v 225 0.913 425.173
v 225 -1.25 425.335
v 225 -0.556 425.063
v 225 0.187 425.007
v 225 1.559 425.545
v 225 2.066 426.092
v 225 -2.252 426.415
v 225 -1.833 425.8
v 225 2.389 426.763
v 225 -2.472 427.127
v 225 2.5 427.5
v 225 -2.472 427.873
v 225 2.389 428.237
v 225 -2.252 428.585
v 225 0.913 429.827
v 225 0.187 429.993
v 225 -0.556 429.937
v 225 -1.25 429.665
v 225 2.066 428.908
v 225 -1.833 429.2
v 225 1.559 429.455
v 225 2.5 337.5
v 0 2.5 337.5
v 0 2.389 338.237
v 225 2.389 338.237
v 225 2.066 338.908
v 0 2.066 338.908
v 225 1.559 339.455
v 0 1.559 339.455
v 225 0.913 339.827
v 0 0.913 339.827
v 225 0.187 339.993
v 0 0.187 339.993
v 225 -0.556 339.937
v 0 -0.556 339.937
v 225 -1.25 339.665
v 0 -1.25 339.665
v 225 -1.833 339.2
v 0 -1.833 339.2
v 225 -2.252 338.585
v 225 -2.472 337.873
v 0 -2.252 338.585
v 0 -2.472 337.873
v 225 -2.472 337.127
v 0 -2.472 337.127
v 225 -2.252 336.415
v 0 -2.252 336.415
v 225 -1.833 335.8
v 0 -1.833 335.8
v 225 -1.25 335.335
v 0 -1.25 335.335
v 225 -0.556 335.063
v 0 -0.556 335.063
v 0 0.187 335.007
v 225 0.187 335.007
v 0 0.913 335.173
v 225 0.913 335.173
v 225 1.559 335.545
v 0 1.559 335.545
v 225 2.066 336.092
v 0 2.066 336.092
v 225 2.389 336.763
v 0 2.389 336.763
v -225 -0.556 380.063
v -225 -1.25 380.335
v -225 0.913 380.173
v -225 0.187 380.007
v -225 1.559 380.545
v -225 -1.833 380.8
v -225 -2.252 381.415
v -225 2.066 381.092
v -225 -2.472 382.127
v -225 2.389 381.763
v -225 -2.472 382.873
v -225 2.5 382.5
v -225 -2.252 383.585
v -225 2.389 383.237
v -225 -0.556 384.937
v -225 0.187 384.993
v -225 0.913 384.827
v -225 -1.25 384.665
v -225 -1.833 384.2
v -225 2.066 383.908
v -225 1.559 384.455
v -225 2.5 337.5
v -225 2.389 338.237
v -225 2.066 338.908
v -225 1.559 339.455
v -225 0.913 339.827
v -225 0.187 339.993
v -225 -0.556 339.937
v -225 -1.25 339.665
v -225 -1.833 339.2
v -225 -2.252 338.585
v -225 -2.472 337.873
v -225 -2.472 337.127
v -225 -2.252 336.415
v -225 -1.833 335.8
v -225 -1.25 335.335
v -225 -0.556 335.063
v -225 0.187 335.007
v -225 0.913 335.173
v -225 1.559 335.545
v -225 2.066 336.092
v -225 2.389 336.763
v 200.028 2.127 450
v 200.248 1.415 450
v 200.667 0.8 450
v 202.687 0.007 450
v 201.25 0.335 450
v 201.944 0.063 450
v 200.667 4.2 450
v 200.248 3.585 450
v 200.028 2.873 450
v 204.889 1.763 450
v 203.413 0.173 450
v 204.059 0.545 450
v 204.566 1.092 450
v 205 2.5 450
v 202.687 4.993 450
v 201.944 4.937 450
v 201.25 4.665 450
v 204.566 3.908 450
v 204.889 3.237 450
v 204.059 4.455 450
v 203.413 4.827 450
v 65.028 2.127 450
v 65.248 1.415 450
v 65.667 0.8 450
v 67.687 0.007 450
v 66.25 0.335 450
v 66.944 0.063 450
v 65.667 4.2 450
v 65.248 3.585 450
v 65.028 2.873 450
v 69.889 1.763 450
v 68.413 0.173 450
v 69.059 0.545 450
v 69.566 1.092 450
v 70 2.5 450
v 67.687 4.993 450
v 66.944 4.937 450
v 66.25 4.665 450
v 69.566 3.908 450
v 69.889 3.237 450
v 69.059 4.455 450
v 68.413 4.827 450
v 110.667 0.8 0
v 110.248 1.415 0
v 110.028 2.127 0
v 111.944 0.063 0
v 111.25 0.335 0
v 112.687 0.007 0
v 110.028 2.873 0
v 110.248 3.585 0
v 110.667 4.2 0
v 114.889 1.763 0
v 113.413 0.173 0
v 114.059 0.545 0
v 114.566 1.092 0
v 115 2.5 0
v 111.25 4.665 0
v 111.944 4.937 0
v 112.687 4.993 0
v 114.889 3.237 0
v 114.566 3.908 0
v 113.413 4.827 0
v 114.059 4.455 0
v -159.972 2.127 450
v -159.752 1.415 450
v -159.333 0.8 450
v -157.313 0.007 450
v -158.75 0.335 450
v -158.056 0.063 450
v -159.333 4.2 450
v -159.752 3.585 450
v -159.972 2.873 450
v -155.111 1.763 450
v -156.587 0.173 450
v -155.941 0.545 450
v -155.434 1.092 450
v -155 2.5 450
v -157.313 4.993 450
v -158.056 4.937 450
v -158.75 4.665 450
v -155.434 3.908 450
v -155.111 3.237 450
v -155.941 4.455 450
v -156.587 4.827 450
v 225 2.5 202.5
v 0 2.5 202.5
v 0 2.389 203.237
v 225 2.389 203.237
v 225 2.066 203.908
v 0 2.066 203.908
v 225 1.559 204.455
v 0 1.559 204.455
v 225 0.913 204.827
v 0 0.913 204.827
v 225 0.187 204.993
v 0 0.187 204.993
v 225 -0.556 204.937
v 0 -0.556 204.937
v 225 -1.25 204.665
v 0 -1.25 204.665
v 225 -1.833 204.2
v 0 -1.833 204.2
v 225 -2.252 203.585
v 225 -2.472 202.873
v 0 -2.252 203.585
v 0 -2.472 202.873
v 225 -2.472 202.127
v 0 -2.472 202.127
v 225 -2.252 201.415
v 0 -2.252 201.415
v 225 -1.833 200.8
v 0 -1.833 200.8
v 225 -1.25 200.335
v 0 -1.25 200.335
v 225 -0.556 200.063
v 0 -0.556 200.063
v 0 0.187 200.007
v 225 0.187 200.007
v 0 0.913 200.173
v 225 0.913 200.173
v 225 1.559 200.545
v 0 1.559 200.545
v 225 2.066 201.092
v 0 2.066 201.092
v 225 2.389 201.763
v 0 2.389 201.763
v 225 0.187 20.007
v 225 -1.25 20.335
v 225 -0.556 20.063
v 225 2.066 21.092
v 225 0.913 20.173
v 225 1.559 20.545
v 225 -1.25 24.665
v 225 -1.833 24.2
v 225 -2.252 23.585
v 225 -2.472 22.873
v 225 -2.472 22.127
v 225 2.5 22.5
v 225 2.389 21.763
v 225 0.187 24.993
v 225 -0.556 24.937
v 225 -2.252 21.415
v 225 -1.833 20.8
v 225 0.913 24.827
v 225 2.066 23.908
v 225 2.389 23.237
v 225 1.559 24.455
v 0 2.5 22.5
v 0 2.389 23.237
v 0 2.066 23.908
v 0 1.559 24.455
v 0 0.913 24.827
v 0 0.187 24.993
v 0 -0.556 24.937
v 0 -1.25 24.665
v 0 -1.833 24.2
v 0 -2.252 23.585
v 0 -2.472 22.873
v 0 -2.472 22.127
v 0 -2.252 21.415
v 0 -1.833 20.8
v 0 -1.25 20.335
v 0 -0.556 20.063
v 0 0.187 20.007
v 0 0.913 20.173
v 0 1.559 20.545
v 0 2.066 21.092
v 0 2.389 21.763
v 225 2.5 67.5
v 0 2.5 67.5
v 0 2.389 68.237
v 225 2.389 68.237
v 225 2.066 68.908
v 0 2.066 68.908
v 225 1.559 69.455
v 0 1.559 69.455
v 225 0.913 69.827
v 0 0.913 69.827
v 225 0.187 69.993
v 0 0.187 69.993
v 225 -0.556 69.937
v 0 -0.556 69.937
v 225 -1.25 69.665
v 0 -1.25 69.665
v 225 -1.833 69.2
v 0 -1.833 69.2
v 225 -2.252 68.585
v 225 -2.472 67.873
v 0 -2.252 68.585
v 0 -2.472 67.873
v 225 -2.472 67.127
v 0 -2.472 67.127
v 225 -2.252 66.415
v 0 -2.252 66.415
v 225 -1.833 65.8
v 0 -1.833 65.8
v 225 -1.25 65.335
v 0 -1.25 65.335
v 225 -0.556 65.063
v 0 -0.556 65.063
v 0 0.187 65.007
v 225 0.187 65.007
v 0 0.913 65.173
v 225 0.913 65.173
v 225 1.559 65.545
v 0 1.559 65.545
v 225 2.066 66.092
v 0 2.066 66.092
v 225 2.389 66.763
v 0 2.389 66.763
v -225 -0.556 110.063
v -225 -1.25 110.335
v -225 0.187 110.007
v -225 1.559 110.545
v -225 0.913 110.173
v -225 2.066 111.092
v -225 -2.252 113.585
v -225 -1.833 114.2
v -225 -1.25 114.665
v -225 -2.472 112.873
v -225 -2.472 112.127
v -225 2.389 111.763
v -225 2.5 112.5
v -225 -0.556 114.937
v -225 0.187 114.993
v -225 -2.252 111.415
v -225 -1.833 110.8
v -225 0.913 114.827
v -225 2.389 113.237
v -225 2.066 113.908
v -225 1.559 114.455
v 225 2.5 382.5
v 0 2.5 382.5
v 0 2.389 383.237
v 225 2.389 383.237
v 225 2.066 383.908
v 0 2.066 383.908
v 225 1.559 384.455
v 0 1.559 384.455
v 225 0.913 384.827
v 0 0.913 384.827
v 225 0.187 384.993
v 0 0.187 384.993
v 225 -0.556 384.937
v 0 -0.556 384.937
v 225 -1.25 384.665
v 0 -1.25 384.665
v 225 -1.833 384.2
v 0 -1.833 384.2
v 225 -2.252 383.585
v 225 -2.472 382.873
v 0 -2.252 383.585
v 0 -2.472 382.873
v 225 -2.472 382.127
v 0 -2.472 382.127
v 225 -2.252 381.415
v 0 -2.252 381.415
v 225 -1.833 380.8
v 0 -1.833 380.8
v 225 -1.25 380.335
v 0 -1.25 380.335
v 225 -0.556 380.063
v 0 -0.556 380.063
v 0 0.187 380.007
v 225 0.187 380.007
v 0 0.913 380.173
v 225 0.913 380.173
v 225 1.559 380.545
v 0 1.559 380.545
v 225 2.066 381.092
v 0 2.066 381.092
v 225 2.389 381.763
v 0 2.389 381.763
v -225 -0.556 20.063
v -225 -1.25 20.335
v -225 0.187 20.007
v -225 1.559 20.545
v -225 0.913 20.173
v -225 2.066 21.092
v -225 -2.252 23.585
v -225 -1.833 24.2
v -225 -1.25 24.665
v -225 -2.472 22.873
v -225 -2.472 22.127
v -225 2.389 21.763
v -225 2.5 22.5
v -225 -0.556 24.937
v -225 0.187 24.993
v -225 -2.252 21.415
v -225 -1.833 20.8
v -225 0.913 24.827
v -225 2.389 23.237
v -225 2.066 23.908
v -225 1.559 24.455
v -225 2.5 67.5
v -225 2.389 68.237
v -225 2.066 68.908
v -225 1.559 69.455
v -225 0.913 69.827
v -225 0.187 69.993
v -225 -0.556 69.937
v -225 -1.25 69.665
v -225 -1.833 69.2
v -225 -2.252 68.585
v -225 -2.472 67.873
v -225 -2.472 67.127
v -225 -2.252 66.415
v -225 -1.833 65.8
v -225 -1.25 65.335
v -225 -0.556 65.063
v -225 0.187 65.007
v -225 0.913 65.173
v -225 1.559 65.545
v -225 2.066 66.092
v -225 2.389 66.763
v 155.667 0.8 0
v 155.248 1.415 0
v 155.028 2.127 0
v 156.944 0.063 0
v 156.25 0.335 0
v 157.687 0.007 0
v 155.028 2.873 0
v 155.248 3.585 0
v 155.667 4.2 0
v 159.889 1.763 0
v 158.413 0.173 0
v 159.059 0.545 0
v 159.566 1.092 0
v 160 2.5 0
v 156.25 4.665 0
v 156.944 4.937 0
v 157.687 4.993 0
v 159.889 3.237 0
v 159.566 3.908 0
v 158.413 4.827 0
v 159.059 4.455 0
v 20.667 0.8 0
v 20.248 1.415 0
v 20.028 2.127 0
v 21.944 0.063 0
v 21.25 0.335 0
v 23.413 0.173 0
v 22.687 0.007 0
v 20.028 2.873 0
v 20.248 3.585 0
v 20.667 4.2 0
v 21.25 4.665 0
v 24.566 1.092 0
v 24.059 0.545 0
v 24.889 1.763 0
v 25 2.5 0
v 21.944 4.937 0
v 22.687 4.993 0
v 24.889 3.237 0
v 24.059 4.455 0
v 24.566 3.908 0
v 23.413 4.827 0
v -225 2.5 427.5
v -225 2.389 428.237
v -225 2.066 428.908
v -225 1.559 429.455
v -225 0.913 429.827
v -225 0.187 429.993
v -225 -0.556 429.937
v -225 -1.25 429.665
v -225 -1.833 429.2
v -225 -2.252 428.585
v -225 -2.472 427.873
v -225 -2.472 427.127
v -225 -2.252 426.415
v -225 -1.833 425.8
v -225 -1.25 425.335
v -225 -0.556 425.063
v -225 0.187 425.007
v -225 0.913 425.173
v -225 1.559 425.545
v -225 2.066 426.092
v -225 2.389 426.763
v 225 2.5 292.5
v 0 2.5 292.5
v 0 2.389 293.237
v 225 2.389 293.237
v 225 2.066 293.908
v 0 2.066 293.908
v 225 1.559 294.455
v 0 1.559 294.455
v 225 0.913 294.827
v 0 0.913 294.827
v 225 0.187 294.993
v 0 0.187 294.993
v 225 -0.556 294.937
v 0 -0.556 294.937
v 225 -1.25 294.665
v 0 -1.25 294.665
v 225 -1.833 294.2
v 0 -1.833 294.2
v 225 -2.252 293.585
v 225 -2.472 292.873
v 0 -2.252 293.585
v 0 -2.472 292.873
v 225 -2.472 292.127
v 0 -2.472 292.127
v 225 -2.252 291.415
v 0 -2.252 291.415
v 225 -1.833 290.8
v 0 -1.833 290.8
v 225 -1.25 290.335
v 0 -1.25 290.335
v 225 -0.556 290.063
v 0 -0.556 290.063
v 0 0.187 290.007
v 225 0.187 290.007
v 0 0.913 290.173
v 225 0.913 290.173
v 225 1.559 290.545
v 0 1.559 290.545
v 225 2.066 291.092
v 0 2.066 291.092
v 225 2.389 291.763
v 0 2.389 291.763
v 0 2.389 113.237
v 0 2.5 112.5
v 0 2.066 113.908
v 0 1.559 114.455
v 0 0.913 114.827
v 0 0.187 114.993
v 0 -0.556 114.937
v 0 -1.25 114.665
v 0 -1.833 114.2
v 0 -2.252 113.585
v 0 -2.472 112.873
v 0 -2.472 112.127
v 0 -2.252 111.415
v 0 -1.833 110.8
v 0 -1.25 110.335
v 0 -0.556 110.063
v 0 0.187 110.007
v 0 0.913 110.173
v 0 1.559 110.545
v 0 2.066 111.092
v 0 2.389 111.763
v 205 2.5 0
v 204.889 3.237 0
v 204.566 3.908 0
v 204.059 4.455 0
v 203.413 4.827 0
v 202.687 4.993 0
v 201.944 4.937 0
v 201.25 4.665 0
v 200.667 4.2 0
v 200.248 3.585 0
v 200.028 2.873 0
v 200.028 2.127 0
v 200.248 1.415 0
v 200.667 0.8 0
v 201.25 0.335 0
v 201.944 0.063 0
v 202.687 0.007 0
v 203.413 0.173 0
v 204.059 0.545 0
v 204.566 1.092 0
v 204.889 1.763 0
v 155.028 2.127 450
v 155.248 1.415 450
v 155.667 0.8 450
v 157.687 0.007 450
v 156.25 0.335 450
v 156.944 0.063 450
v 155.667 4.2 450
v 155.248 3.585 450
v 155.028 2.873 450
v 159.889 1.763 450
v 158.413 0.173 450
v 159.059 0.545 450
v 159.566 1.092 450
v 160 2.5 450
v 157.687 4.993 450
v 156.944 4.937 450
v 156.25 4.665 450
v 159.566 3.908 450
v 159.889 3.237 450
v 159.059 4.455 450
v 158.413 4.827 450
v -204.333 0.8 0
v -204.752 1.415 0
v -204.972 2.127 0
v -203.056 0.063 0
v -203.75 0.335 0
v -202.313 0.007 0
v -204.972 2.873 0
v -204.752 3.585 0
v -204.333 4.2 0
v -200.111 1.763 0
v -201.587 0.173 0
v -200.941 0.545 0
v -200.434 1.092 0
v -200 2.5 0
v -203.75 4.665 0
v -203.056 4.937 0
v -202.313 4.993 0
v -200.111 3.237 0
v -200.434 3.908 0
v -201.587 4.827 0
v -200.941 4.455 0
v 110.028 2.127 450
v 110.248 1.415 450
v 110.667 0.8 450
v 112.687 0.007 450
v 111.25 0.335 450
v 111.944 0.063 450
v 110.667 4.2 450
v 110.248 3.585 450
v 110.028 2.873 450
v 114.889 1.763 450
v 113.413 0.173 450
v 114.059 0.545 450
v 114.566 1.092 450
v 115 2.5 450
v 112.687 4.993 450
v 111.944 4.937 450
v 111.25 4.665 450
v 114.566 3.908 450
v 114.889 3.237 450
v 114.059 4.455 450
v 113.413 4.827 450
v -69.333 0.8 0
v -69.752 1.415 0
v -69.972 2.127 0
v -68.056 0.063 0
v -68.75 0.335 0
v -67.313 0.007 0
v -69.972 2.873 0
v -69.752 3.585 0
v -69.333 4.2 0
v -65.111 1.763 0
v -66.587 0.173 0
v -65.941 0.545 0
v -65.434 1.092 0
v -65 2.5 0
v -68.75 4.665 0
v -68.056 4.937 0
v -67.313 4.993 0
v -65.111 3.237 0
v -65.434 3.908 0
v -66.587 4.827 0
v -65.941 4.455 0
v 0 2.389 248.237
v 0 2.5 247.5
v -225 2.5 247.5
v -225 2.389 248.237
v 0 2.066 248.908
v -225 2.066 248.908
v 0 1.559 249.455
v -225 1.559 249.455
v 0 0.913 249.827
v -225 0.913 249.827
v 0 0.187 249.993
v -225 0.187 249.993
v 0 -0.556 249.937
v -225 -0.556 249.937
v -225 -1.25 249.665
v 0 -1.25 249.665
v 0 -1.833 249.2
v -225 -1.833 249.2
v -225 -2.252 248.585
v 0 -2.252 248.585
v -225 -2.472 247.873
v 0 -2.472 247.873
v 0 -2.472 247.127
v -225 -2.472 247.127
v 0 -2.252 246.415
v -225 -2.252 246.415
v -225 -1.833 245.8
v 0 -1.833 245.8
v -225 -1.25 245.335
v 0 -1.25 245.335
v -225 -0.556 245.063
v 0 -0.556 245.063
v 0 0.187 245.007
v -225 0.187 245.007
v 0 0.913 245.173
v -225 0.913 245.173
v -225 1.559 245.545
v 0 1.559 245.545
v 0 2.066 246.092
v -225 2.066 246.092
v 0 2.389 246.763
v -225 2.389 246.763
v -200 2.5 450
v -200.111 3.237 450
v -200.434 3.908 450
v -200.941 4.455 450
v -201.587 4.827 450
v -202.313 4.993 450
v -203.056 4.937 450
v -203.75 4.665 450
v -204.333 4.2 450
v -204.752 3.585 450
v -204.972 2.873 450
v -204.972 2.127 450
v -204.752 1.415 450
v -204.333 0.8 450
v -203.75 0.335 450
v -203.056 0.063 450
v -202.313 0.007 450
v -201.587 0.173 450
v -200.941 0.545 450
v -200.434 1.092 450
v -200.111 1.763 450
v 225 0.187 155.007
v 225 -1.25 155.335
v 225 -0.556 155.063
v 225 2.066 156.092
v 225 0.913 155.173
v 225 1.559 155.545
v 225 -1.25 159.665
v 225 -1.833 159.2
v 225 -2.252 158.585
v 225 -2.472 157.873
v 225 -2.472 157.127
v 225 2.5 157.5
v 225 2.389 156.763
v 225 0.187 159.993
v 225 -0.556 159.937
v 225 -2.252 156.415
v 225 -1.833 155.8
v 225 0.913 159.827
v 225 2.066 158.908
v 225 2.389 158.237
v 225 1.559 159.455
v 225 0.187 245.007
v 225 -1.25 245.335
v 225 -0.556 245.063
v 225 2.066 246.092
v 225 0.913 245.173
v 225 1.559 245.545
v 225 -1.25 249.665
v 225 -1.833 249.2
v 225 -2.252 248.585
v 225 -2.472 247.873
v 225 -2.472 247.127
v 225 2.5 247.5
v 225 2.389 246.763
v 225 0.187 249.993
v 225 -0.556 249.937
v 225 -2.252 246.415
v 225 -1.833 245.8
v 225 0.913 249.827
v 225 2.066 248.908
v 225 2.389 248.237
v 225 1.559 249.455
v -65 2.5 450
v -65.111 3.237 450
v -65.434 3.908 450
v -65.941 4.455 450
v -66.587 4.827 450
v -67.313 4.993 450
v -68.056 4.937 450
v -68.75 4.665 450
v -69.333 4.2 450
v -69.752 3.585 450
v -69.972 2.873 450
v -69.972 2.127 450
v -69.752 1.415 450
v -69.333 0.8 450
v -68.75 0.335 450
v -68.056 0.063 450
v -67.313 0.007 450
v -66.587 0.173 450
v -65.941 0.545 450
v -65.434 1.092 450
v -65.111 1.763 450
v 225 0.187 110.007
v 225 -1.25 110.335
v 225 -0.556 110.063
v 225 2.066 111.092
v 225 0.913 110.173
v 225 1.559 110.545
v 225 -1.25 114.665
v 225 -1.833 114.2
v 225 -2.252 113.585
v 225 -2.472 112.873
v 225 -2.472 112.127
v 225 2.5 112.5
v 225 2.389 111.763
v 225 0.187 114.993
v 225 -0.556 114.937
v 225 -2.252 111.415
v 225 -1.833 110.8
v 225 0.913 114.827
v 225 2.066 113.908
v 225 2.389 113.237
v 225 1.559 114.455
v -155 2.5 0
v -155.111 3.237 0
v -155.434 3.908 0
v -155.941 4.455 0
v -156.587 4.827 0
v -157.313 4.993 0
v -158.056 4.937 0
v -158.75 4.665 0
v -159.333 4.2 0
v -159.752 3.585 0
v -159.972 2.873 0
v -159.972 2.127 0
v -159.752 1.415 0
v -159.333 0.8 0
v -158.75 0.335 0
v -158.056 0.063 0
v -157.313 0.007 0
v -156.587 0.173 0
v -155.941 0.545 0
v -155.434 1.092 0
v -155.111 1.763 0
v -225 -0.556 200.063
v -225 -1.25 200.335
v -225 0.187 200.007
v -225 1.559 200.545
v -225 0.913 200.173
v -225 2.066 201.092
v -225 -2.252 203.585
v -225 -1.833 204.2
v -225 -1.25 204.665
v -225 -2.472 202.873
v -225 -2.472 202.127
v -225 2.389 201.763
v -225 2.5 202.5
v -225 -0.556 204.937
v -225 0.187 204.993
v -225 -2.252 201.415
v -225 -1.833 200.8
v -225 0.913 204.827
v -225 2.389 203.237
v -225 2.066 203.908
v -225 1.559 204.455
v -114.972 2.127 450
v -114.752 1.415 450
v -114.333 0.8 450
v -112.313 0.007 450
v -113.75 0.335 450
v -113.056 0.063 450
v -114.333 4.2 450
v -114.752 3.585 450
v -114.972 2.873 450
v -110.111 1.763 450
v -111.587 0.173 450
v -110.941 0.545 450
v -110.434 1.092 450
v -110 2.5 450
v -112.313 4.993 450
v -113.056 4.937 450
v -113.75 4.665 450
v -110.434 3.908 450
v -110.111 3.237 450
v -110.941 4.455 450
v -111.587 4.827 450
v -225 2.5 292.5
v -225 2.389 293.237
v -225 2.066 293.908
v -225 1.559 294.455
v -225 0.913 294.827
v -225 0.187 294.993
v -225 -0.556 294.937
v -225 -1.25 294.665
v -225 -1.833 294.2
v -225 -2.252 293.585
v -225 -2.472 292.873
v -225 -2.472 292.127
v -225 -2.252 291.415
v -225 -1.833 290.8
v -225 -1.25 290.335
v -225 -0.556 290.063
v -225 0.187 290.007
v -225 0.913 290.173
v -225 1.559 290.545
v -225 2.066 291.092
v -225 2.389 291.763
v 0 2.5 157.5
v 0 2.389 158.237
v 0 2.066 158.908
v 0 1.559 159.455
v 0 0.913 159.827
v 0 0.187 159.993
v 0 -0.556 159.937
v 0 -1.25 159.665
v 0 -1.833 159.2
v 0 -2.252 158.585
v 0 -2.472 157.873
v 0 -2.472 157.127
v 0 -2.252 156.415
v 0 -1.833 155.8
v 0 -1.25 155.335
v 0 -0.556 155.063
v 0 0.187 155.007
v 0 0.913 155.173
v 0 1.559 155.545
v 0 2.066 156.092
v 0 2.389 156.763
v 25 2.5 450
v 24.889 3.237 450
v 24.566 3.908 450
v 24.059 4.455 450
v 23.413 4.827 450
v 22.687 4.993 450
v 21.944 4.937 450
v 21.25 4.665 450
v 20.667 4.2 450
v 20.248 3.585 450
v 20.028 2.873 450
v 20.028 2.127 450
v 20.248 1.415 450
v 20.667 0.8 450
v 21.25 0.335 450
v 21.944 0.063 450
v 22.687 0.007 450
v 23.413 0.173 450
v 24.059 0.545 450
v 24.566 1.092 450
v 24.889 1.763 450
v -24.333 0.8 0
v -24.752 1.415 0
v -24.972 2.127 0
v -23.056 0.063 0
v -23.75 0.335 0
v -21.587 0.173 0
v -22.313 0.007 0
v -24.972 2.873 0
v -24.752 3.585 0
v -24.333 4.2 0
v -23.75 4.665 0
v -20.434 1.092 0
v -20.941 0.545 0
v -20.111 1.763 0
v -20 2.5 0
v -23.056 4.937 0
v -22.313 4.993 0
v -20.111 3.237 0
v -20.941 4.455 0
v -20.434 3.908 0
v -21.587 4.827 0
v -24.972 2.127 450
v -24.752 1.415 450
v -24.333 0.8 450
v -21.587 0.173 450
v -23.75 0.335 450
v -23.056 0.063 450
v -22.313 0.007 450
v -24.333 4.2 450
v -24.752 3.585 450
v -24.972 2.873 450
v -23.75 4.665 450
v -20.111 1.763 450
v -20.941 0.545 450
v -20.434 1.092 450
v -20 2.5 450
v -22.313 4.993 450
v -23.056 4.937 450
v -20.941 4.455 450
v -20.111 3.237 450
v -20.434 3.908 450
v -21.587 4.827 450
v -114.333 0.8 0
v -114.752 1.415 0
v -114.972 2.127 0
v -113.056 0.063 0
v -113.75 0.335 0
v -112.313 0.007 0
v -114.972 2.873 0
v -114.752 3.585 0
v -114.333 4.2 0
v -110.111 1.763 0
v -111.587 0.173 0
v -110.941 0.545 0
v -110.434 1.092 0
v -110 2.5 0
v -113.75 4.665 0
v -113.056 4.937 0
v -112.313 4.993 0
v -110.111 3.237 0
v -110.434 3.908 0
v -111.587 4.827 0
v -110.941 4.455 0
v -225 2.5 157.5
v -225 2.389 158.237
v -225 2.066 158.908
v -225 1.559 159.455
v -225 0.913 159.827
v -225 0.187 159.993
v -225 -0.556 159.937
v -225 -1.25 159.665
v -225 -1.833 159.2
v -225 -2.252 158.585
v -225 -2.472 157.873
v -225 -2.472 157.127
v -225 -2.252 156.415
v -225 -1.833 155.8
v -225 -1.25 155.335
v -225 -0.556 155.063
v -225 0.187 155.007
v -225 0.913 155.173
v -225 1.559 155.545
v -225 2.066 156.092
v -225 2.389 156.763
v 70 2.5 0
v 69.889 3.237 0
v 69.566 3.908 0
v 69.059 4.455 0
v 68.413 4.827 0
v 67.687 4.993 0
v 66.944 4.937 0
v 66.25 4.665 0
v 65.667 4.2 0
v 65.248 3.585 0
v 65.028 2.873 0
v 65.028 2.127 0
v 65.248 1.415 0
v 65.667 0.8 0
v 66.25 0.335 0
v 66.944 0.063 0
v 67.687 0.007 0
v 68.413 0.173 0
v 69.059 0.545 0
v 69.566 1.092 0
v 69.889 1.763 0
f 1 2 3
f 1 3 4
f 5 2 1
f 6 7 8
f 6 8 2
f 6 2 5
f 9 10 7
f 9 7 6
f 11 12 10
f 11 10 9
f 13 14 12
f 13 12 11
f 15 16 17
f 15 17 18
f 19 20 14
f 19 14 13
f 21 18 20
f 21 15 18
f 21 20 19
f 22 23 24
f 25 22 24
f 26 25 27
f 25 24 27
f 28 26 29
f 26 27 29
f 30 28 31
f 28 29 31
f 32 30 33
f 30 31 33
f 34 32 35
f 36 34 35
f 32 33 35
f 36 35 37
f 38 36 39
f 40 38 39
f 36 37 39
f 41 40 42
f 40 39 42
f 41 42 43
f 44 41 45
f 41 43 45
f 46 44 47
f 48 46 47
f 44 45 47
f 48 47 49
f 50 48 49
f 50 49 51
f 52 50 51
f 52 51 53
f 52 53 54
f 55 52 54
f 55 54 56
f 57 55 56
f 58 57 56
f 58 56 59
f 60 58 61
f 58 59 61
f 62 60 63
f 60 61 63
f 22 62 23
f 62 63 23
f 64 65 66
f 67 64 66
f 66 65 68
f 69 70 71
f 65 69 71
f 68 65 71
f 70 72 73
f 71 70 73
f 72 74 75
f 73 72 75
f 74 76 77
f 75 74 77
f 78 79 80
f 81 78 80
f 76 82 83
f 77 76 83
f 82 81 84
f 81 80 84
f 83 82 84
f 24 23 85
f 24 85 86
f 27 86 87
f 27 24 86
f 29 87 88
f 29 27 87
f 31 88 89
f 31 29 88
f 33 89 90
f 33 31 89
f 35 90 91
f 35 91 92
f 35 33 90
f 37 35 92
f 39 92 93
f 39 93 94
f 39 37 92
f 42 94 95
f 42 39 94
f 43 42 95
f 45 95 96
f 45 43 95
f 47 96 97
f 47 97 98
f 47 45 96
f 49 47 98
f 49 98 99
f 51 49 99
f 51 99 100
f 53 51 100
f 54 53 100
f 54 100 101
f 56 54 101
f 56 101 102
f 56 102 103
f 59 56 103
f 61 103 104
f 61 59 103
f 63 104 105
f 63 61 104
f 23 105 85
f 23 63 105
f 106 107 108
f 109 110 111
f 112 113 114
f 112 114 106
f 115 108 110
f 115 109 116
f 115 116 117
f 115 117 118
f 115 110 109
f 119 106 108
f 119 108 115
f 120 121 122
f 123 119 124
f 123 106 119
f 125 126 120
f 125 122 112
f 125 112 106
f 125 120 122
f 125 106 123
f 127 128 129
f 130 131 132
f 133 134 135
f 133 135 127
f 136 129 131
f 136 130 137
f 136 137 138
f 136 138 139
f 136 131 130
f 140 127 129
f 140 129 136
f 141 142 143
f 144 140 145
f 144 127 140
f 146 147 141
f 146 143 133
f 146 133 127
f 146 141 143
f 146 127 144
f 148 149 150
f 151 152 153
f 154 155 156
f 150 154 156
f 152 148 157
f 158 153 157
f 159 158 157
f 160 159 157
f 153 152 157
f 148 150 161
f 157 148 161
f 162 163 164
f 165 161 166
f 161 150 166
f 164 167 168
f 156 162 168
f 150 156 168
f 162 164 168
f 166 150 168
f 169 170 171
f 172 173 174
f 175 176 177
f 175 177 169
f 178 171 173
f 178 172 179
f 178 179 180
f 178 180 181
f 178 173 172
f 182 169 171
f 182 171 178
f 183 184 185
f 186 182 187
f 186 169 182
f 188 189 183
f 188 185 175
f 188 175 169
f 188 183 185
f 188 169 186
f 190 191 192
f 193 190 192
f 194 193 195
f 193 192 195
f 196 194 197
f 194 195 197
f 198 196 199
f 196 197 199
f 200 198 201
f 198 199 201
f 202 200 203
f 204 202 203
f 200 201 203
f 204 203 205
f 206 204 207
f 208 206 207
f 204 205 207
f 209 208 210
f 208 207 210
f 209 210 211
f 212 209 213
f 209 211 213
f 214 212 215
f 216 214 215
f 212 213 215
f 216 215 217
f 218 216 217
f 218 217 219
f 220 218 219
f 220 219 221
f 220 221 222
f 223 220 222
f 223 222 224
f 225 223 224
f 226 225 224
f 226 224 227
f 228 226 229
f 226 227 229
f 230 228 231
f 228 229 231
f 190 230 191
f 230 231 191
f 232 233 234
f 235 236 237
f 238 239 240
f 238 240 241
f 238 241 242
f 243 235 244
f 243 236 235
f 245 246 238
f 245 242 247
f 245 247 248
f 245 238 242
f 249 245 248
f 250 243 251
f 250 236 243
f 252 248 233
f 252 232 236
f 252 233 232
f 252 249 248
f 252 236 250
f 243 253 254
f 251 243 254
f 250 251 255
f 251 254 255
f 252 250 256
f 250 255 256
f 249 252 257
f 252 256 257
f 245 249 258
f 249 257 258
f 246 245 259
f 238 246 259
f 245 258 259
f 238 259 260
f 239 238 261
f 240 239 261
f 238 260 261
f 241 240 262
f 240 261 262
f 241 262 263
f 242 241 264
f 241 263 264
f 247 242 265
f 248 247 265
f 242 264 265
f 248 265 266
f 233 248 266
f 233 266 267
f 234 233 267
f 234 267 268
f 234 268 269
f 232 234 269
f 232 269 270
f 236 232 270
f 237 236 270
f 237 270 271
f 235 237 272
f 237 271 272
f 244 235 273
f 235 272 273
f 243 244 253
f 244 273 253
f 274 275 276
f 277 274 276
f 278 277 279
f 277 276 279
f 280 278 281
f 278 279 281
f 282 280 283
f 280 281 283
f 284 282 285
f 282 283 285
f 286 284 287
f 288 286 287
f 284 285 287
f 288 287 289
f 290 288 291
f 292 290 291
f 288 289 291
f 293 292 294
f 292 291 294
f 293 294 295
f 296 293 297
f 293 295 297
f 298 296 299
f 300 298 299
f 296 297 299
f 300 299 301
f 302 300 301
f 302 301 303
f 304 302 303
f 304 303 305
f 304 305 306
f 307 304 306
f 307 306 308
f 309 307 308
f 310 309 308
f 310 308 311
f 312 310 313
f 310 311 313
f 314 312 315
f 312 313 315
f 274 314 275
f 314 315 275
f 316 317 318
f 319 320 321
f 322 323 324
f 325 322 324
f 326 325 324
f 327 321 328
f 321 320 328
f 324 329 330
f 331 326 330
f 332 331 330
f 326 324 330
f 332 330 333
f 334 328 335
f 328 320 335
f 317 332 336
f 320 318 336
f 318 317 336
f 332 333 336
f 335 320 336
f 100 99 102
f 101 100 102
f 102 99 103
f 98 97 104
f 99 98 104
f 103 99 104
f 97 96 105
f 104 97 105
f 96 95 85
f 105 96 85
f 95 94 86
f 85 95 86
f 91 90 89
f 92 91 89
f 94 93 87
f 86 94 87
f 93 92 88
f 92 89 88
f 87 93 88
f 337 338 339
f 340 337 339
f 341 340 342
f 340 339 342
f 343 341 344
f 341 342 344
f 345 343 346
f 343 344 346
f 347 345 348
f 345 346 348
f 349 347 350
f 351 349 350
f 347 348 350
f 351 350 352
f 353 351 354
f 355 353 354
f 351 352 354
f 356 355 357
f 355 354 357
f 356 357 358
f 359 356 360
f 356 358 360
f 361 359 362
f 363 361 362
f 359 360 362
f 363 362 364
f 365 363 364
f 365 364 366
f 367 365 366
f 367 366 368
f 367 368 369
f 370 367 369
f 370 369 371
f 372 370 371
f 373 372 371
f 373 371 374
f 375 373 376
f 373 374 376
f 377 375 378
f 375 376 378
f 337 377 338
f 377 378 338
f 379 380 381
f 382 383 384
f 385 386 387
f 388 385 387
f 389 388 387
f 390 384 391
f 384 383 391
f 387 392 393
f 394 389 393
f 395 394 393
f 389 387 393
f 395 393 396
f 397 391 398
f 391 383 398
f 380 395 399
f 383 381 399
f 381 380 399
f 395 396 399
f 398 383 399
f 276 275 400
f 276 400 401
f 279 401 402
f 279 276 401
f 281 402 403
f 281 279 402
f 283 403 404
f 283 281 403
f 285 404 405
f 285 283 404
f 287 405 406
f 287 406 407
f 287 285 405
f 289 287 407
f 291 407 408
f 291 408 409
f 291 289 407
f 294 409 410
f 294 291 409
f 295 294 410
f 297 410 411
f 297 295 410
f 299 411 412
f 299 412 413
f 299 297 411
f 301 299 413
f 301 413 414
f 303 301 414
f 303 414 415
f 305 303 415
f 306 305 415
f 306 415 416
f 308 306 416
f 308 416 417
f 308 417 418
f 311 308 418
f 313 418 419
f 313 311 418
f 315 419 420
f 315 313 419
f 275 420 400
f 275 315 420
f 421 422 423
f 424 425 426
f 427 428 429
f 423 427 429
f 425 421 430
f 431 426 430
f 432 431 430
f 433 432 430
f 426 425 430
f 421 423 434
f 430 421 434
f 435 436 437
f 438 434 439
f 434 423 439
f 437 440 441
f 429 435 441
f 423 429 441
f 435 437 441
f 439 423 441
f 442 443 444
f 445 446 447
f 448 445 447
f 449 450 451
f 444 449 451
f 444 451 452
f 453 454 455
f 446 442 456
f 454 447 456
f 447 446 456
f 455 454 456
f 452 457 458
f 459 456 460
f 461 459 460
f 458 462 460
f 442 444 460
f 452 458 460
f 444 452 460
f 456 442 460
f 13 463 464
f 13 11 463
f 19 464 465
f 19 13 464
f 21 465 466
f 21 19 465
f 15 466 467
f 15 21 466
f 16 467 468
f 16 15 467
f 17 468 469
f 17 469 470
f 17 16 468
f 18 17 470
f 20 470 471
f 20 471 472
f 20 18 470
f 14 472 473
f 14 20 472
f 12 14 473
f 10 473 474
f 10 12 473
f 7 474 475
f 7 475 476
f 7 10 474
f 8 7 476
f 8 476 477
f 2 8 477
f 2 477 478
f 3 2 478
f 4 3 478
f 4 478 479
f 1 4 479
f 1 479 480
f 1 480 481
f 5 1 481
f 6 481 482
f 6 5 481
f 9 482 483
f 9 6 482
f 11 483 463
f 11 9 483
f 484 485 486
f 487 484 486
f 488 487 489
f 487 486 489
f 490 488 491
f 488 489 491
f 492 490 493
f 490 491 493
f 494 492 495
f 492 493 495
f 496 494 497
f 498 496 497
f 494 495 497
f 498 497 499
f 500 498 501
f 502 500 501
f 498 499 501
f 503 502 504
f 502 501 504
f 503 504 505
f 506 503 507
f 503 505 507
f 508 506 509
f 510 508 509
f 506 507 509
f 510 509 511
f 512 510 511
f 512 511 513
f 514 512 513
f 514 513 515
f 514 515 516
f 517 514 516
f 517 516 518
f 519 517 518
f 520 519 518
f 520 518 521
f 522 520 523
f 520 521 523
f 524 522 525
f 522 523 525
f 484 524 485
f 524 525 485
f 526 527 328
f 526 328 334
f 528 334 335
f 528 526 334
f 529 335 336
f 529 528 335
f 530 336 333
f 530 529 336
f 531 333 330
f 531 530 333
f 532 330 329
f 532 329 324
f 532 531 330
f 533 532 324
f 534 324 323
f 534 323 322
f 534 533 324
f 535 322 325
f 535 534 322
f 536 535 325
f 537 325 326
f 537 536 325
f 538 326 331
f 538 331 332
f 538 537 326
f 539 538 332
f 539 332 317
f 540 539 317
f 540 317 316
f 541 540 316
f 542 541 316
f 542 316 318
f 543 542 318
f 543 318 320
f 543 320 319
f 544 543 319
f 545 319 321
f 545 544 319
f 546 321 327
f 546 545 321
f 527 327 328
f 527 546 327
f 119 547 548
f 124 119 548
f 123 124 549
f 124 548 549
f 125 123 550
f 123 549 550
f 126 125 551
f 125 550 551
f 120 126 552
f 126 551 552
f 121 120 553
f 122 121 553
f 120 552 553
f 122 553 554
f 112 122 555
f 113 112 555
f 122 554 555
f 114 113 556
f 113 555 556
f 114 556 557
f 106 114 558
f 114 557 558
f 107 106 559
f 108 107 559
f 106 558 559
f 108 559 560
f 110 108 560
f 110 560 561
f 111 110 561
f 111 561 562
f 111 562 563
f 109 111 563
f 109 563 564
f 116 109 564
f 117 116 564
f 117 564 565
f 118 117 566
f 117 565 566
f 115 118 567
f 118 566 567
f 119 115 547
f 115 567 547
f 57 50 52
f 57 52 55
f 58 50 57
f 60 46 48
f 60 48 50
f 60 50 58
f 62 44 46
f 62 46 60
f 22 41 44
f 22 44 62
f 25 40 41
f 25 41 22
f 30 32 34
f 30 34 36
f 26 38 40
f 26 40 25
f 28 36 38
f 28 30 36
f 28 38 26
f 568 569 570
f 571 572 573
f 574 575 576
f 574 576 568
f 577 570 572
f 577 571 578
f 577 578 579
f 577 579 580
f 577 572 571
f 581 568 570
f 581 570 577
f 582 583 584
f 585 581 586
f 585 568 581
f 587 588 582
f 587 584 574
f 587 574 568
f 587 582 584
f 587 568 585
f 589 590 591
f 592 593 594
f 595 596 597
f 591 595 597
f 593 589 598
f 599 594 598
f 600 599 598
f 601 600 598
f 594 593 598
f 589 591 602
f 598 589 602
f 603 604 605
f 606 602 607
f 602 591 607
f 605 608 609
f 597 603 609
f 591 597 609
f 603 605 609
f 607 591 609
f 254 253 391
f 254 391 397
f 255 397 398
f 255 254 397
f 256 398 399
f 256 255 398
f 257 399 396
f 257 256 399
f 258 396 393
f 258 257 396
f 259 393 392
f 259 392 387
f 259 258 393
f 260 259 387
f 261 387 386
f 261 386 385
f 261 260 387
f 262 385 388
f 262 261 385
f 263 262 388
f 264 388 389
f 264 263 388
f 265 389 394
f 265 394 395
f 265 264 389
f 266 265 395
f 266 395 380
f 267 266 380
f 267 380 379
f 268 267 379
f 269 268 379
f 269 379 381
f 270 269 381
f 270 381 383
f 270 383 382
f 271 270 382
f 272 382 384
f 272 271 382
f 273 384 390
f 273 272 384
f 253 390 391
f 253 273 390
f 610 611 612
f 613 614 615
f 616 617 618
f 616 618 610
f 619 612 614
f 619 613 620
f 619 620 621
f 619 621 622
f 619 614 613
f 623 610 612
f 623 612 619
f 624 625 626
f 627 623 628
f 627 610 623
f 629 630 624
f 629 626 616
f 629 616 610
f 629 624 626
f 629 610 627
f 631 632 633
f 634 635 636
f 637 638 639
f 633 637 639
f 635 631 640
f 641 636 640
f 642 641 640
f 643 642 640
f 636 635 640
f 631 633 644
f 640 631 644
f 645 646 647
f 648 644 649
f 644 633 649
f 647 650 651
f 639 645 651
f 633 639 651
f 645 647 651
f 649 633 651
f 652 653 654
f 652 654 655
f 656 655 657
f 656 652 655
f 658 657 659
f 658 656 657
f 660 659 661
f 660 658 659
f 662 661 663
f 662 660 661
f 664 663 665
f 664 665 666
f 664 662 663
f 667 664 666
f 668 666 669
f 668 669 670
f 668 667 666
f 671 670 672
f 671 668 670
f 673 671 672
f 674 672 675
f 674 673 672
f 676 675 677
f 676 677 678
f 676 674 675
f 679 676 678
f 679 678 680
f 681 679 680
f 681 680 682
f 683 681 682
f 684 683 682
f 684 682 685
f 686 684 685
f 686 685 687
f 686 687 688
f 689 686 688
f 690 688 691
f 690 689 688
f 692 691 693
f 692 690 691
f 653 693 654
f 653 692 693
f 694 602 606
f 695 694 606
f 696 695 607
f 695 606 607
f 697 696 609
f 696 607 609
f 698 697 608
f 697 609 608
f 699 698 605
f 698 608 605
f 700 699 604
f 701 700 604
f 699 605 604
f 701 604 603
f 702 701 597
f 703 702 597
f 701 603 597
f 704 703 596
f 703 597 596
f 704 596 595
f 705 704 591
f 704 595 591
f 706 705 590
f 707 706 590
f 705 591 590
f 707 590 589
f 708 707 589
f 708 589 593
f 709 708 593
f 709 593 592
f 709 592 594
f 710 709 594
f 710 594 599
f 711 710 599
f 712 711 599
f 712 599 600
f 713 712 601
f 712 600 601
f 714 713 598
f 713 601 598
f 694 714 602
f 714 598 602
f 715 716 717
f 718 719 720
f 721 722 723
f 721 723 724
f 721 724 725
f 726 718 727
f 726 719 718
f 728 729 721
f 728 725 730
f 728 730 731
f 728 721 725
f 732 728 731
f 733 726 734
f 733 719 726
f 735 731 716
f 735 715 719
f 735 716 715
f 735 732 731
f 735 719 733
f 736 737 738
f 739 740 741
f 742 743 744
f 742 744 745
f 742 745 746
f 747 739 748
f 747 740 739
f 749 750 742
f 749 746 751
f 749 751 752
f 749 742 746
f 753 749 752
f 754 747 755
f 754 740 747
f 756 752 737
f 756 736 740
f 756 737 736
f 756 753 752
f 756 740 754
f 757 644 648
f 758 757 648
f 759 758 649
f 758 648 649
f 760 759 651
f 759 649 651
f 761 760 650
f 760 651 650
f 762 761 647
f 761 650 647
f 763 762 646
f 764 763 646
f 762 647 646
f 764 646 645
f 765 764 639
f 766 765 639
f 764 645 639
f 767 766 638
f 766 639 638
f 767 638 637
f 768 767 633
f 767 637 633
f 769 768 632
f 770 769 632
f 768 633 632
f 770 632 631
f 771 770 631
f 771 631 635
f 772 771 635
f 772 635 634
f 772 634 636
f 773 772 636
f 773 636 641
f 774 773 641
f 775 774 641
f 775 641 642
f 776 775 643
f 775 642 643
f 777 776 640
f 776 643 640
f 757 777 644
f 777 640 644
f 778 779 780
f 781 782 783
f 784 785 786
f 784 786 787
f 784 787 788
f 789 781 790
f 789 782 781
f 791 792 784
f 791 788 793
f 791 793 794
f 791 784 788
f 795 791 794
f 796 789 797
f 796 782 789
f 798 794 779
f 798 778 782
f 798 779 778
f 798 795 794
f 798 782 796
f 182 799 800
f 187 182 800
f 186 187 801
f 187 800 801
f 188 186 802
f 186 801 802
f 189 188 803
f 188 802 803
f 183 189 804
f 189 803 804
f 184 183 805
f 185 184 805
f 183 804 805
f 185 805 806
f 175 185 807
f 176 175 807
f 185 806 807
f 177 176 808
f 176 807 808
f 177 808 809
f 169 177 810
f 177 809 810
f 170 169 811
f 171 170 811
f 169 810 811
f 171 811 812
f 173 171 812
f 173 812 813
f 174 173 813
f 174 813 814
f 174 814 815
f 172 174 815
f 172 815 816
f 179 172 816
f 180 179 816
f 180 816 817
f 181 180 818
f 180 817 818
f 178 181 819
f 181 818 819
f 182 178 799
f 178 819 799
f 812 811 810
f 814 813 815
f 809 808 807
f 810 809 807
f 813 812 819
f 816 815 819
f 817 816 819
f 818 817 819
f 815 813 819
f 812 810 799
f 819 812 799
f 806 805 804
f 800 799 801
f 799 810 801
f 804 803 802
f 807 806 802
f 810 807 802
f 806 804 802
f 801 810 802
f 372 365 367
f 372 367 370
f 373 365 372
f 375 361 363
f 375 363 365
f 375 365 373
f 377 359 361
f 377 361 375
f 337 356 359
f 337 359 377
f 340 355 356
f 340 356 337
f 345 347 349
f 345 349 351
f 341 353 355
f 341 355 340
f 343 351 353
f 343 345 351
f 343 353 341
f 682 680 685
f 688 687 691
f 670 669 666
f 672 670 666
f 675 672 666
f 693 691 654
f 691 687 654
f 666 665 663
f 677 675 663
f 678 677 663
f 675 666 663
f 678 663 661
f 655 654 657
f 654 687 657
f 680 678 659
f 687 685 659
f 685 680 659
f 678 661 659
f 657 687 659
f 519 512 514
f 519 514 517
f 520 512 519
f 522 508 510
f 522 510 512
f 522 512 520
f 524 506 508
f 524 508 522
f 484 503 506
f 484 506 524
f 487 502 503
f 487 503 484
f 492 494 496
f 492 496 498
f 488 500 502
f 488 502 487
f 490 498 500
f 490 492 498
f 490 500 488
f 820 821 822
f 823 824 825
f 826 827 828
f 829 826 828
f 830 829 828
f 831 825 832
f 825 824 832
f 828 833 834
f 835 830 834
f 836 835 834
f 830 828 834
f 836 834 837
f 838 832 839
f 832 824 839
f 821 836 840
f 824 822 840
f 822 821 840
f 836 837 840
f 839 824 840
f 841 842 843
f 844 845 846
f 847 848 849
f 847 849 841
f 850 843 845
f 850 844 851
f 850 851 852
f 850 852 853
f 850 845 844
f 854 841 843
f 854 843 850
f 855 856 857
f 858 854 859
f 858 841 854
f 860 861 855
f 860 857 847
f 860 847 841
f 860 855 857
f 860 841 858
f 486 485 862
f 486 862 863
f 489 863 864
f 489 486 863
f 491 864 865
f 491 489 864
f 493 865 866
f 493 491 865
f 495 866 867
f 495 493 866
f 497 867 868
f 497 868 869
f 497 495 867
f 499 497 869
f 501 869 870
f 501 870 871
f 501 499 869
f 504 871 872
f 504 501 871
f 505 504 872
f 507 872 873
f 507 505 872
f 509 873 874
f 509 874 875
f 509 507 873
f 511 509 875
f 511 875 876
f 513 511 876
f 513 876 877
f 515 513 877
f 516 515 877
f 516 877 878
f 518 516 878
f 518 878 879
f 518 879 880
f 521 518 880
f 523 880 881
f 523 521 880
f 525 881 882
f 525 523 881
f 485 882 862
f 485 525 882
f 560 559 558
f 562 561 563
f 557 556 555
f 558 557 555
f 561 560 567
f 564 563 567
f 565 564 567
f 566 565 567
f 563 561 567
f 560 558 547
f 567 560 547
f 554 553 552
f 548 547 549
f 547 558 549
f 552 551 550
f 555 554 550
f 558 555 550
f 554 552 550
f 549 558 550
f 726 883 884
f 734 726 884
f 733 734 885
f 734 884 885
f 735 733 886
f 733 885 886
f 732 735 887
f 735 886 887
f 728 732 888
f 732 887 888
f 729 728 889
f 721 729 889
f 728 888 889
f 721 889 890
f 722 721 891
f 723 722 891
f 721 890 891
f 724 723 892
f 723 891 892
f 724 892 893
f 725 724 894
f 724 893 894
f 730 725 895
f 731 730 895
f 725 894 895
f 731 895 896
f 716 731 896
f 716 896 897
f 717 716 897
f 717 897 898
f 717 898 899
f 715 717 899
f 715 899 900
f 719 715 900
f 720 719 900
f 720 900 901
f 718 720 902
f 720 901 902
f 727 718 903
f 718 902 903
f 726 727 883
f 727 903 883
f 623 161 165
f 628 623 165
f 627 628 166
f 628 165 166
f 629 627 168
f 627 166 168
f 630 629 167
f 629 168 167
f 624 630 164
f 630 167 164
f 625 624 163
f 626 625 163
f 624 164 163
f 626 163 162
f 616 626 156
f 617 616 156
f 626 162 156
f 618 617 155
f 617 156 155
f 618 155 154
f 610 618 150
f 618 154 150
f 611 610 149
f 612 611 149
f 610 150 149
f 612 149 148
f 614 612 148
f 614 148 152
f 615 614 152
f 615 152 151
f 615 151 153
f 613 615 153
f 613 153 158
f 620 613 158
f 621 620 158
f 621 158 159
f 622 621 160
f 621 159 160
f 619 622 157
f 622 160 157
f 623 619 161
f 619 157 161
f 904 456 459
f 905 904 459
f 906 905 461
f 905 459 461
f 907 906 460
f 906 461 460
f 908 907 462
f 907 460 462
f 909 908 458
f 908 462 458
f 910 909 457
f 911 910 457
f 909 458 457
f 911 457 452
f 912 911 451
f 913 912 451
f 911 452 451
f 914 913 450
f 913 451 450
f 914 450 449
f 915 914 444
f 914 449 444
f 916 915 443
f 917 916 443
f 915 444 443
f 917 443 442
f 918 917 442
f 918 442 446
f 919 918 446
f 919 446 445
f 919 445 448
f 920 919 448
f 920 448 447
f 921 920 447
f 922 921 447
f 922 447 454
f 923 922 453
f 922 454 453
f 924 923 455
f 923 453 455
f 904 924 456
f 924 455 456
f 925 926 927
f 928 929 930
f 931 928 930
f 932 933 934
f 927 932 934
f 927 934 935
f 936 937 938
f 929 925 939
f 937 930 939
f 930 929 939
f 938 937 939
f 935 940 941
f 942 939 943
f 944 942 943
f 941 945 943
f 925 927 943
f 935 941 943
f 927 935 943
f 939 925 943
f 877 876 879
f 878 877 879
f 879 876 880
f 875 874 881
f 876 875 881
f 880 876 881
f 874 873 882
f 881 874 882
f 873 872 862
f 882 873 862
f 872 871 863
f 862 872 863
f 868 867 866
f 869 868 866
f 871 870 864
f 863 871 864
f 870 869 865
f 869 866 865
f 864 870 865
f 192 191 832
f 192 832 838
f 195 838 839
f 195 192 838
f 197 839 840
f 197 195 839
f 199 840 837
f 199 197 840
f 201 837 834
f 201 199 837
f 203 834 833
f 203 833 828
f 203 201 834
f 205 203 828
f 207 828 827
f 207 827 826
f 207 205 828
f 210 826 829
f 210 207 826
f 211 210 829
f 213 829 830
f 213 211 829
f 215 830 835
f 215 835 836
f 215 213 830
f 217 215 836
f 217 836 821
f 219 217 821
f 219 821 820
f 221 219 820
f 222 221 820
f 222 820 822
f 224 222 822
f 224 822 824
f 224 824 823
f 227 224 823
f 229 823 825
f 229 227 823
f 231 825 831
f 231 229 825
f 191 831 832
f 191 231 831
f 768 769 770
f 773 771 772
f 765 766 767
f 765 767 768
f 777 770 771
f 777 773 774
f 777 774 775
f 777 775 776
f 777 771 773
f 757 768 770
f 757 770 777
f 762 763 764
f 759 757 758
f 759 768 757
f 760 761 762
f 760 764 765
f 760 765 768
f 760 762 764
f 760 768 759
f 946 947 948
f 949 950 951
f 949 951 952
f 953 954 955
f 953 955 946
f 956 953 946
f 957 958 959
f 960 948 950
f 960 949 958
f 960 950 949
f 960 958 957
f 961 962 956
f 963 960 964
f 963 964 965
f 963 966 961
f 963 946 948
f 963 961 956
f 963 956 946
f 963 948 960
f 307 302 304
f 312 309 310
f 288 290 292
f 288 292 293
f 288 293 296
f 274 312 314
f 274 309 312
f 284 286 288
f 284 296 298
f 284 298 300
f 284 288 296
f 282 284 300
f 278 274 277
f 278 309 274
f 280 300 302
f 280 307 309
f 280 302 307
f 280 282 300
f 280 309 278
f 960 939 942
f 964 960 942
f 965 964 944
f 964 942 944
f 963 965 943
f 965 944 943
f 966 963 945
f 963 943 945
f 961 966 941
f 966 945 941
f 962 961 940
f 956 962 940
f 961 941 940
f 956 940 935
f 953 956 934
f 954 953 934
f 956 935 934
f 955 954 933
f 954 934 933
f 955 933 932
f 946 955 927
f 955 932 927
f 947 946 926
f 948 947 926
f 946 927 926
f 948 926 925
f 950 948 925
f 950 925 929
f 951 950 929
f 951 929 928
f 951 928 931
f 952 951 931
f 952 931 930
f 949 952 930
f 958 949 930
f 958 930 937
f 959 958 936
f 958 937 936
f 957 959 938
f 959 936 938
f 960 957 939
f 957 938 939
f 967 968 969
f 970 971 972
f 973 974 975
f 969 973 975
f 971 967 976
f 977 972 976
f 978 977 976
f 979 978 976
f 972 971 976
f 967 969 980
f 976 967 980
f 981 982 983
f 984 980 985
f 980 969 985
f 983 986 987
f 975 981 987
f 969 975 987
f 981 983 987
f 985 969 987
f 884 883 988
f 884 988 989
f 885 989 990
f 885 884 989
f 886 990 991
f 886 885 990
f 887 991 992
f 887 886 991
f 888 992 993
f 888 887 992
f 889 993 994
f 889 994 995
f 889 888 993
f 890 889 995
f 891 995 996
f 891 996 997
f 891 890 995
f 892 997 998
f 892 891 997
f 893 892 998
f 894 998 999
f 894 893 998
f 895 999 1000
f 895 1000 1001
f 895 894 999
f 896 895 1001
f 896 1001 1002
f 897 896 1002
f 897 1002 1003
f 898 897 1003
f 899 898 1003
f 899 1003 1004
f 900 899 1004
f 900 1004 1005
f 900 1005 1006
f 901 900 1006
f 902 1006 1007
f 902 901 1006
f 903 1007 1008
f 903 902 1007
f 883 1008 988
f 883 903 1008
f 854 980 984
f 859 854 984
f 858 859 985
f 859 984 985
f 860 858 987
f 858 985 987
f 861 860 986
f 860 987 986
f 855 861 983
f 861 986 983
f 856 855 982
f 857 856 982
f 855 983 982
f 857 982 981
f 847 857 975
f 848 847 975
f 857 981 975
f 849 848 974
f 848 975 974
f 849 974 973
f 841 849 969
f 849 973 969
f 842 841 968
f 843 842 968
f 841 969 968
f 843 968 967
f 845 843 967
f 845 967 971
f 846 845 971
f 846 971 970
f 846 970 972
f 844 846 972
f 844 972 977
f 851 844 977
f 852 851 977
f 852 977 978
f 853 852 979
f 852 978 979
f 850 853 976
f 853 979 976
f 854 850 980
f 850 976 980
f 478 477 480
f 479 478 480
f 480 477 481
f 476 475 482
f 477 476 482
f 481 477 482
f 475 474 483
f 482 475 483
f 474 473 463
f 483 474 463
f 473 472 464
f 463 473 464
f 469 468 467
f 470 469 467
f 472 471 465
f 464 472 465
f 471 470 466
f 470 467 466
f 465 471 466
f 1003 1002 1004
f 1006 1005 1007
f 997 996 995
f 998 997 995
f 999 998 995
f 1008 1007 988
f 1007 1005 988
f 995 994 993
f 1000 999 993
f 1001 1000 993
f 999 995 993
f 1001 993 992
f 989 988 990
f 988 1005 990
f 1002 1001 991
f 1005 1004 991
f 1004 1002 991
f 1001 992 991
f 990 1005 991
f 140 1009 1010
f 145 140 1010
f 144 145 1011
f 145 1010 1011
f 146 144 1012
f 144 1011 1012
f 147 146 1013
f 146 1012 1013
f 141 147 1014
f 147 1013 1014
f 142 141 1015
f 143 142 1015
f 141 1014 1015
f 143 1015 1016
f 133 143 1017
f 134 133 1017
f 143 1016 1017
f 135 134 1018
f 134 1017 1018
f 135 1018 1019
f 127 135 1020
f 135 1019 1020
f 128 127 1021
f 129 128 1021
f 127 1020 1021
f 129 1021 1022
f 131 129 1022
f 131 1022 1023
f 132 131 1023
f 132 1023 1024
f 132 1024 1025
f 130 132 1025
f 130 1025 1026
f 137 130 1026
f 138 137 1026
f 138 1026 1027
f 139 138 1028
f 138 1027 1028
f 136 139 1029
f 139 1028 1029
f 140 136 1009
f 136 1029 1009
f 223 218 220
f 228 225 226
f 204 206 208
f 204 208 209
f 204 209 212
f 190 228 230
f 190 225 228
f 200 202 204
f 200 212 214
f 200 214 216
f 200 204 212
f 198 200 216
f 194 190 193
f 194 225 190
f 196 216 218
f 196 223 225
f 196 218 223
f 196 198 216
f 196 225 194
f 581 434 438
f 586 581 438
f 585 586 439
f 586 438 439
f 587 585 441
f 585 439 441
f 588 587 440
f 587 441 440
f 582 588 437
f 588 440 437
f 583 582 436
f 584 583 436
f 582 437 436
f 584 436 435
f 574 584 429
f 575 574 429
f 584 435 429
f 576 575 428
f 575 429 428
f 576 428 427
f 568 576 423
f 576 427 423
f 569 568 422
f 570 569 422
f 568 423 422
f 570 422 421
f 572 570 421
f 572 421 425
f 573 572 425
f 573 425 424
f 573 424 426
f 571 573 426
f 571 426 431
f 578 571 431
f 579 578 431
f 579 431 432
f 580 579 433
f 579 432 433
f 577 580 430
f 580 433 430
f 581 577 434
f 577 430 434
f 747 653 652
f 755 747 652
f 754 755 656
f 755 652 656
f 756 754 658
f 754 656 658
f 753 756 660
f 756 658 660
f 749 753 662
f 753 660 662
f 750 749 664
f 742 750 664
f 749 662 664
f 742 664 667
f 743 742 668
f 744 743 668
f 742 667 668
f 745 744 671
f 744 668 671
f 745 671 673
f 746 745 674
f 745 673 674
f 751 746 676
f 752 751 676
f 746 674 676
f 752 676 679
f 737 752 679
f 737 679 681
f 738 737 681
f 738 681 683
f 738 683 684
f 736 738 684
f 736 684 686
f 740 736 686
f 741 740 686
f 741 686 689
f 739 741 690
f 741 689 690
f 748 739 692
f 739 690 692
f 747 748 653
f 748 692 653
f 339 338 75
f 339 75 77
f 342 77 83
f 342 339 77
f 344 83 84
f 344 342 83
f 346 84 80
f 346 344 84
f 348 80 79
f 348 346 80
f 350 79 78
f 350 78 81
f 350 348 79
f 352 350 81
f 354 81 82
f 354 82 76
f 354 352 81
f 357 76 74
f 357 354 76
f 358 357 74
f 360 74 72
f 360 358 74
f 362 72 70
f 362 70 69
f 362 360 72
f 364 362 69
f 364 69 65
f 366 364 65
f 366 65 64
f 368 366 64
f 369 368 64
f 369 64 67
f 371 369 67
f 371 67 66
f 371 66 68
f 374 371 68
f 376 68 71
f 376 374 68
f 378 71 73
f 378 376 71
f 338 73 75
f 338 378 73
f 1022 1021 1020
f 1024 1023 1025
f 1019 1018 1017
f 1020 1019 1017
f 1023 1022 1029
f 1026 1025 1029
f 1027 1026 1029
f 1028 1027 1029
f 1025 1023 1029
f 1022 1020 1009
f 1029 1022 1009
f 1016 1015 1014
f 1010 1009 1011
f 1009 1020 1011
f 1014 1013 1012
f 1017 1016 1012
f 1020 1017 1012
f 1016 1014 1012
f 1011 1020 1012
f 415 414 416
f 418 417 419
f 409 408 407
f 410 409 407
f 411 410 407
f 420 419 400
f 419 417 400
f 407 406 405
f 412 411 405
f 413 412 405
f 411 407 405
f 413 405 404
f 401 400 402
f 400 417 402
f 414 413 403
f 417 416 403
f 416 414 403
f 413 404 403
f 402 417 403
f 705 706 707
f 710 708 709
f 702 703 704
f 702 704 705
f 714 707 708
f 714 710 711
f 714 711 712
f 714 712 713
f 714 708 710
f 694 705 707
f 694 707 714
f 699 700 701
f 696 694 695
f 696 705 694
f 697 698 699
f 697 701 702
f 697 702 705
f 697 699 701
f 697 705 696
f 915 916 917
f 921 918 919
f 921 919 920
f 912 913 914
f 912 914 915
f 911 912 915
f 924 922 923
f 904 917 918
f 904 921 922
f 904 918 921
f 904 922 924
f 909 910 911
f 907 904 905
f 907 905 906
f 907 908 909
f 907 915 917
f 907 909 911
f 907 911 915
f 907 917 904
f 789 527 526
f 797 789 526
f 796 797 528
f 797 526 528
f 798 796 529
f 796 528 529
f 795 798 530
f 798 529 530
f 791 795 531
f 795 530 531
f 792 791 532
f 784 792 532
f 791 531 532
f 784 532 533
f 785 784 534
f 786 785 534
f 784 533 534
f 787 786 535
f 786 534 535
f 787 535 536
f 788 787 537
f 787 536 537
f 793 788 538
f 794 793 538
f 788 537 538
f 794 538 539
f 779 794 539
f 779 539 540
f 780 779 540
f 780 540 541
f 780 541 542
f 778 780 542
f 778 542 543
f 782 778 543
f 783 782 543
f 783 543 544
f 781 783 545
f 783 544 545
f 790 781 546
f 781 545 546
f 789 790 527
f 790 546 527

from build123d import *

# Parameters (mm, degrees)
F0_R     = 2.5
F1_DEPTH = 225
F2_R     = 2.5
F3_DEPTH = 450


with BuildPart() as f1:
    # F0 (on Right) → F1 (new body, symmetric)
    with BuildSketch(Plane.YZ):
        with Locations((0, 22.5)):
            Circle(F0_R)
        with Locations((0, 67.5)):
            Circle(F0_R)
        with Locations((0, 112.5)):
            Circle(F0_R)
        with Locations((0, 157.5)):
            Circle(F0_R)
        with Locations((0, 202.5)):
            Circle(F0_R)
        with Locations((0, 247.5)):
            Circle(F0_R)
        with Locations((0, 292.5)):
            Circle(F0_R)
        with Locations((0, 337.5)):
            Circle(F0_R)
        with Locations((0, 382.5)):
            Circle(F0_R)
        with Locations((0, 427.5)):
            Circle(F0_R)
    extrude(amount=F1_DEPTH, both=True)


with BuildPart() as f3:
    # F2 (on Top) → F3 (new body)
    with BuildSketch(Plane.XY):
        with Locations((-202.5, 2.5)):
            Circle(F2_R)
        with Locations((-157.5, 2.5)):
            Circle(F2_R)
        with Locations((-112.5, 2.5)):
            Circle(F2_R)
        with Locations((-67.5, 2.5)):
            Circle(F2_R)
        with Locations((-22.5, 2.5)):
            Circle(F2_R)
        with Locations((22.5, 2.5)):
            Circle(F2_R)
        with Locations((67.5, 2.5)):
            Circle(F2_R)
        with Locations((112.5, 2.5)):
            Circle(F2_R)
        with Locations((157.5, 2.5)):
            Circle(F2_R)
        with Locations((202.5, 2.5)):
            Circle(F2_R)
    extrude(amount=F3_DEPTH)


solid = Compound([f1.part, f3.part])
